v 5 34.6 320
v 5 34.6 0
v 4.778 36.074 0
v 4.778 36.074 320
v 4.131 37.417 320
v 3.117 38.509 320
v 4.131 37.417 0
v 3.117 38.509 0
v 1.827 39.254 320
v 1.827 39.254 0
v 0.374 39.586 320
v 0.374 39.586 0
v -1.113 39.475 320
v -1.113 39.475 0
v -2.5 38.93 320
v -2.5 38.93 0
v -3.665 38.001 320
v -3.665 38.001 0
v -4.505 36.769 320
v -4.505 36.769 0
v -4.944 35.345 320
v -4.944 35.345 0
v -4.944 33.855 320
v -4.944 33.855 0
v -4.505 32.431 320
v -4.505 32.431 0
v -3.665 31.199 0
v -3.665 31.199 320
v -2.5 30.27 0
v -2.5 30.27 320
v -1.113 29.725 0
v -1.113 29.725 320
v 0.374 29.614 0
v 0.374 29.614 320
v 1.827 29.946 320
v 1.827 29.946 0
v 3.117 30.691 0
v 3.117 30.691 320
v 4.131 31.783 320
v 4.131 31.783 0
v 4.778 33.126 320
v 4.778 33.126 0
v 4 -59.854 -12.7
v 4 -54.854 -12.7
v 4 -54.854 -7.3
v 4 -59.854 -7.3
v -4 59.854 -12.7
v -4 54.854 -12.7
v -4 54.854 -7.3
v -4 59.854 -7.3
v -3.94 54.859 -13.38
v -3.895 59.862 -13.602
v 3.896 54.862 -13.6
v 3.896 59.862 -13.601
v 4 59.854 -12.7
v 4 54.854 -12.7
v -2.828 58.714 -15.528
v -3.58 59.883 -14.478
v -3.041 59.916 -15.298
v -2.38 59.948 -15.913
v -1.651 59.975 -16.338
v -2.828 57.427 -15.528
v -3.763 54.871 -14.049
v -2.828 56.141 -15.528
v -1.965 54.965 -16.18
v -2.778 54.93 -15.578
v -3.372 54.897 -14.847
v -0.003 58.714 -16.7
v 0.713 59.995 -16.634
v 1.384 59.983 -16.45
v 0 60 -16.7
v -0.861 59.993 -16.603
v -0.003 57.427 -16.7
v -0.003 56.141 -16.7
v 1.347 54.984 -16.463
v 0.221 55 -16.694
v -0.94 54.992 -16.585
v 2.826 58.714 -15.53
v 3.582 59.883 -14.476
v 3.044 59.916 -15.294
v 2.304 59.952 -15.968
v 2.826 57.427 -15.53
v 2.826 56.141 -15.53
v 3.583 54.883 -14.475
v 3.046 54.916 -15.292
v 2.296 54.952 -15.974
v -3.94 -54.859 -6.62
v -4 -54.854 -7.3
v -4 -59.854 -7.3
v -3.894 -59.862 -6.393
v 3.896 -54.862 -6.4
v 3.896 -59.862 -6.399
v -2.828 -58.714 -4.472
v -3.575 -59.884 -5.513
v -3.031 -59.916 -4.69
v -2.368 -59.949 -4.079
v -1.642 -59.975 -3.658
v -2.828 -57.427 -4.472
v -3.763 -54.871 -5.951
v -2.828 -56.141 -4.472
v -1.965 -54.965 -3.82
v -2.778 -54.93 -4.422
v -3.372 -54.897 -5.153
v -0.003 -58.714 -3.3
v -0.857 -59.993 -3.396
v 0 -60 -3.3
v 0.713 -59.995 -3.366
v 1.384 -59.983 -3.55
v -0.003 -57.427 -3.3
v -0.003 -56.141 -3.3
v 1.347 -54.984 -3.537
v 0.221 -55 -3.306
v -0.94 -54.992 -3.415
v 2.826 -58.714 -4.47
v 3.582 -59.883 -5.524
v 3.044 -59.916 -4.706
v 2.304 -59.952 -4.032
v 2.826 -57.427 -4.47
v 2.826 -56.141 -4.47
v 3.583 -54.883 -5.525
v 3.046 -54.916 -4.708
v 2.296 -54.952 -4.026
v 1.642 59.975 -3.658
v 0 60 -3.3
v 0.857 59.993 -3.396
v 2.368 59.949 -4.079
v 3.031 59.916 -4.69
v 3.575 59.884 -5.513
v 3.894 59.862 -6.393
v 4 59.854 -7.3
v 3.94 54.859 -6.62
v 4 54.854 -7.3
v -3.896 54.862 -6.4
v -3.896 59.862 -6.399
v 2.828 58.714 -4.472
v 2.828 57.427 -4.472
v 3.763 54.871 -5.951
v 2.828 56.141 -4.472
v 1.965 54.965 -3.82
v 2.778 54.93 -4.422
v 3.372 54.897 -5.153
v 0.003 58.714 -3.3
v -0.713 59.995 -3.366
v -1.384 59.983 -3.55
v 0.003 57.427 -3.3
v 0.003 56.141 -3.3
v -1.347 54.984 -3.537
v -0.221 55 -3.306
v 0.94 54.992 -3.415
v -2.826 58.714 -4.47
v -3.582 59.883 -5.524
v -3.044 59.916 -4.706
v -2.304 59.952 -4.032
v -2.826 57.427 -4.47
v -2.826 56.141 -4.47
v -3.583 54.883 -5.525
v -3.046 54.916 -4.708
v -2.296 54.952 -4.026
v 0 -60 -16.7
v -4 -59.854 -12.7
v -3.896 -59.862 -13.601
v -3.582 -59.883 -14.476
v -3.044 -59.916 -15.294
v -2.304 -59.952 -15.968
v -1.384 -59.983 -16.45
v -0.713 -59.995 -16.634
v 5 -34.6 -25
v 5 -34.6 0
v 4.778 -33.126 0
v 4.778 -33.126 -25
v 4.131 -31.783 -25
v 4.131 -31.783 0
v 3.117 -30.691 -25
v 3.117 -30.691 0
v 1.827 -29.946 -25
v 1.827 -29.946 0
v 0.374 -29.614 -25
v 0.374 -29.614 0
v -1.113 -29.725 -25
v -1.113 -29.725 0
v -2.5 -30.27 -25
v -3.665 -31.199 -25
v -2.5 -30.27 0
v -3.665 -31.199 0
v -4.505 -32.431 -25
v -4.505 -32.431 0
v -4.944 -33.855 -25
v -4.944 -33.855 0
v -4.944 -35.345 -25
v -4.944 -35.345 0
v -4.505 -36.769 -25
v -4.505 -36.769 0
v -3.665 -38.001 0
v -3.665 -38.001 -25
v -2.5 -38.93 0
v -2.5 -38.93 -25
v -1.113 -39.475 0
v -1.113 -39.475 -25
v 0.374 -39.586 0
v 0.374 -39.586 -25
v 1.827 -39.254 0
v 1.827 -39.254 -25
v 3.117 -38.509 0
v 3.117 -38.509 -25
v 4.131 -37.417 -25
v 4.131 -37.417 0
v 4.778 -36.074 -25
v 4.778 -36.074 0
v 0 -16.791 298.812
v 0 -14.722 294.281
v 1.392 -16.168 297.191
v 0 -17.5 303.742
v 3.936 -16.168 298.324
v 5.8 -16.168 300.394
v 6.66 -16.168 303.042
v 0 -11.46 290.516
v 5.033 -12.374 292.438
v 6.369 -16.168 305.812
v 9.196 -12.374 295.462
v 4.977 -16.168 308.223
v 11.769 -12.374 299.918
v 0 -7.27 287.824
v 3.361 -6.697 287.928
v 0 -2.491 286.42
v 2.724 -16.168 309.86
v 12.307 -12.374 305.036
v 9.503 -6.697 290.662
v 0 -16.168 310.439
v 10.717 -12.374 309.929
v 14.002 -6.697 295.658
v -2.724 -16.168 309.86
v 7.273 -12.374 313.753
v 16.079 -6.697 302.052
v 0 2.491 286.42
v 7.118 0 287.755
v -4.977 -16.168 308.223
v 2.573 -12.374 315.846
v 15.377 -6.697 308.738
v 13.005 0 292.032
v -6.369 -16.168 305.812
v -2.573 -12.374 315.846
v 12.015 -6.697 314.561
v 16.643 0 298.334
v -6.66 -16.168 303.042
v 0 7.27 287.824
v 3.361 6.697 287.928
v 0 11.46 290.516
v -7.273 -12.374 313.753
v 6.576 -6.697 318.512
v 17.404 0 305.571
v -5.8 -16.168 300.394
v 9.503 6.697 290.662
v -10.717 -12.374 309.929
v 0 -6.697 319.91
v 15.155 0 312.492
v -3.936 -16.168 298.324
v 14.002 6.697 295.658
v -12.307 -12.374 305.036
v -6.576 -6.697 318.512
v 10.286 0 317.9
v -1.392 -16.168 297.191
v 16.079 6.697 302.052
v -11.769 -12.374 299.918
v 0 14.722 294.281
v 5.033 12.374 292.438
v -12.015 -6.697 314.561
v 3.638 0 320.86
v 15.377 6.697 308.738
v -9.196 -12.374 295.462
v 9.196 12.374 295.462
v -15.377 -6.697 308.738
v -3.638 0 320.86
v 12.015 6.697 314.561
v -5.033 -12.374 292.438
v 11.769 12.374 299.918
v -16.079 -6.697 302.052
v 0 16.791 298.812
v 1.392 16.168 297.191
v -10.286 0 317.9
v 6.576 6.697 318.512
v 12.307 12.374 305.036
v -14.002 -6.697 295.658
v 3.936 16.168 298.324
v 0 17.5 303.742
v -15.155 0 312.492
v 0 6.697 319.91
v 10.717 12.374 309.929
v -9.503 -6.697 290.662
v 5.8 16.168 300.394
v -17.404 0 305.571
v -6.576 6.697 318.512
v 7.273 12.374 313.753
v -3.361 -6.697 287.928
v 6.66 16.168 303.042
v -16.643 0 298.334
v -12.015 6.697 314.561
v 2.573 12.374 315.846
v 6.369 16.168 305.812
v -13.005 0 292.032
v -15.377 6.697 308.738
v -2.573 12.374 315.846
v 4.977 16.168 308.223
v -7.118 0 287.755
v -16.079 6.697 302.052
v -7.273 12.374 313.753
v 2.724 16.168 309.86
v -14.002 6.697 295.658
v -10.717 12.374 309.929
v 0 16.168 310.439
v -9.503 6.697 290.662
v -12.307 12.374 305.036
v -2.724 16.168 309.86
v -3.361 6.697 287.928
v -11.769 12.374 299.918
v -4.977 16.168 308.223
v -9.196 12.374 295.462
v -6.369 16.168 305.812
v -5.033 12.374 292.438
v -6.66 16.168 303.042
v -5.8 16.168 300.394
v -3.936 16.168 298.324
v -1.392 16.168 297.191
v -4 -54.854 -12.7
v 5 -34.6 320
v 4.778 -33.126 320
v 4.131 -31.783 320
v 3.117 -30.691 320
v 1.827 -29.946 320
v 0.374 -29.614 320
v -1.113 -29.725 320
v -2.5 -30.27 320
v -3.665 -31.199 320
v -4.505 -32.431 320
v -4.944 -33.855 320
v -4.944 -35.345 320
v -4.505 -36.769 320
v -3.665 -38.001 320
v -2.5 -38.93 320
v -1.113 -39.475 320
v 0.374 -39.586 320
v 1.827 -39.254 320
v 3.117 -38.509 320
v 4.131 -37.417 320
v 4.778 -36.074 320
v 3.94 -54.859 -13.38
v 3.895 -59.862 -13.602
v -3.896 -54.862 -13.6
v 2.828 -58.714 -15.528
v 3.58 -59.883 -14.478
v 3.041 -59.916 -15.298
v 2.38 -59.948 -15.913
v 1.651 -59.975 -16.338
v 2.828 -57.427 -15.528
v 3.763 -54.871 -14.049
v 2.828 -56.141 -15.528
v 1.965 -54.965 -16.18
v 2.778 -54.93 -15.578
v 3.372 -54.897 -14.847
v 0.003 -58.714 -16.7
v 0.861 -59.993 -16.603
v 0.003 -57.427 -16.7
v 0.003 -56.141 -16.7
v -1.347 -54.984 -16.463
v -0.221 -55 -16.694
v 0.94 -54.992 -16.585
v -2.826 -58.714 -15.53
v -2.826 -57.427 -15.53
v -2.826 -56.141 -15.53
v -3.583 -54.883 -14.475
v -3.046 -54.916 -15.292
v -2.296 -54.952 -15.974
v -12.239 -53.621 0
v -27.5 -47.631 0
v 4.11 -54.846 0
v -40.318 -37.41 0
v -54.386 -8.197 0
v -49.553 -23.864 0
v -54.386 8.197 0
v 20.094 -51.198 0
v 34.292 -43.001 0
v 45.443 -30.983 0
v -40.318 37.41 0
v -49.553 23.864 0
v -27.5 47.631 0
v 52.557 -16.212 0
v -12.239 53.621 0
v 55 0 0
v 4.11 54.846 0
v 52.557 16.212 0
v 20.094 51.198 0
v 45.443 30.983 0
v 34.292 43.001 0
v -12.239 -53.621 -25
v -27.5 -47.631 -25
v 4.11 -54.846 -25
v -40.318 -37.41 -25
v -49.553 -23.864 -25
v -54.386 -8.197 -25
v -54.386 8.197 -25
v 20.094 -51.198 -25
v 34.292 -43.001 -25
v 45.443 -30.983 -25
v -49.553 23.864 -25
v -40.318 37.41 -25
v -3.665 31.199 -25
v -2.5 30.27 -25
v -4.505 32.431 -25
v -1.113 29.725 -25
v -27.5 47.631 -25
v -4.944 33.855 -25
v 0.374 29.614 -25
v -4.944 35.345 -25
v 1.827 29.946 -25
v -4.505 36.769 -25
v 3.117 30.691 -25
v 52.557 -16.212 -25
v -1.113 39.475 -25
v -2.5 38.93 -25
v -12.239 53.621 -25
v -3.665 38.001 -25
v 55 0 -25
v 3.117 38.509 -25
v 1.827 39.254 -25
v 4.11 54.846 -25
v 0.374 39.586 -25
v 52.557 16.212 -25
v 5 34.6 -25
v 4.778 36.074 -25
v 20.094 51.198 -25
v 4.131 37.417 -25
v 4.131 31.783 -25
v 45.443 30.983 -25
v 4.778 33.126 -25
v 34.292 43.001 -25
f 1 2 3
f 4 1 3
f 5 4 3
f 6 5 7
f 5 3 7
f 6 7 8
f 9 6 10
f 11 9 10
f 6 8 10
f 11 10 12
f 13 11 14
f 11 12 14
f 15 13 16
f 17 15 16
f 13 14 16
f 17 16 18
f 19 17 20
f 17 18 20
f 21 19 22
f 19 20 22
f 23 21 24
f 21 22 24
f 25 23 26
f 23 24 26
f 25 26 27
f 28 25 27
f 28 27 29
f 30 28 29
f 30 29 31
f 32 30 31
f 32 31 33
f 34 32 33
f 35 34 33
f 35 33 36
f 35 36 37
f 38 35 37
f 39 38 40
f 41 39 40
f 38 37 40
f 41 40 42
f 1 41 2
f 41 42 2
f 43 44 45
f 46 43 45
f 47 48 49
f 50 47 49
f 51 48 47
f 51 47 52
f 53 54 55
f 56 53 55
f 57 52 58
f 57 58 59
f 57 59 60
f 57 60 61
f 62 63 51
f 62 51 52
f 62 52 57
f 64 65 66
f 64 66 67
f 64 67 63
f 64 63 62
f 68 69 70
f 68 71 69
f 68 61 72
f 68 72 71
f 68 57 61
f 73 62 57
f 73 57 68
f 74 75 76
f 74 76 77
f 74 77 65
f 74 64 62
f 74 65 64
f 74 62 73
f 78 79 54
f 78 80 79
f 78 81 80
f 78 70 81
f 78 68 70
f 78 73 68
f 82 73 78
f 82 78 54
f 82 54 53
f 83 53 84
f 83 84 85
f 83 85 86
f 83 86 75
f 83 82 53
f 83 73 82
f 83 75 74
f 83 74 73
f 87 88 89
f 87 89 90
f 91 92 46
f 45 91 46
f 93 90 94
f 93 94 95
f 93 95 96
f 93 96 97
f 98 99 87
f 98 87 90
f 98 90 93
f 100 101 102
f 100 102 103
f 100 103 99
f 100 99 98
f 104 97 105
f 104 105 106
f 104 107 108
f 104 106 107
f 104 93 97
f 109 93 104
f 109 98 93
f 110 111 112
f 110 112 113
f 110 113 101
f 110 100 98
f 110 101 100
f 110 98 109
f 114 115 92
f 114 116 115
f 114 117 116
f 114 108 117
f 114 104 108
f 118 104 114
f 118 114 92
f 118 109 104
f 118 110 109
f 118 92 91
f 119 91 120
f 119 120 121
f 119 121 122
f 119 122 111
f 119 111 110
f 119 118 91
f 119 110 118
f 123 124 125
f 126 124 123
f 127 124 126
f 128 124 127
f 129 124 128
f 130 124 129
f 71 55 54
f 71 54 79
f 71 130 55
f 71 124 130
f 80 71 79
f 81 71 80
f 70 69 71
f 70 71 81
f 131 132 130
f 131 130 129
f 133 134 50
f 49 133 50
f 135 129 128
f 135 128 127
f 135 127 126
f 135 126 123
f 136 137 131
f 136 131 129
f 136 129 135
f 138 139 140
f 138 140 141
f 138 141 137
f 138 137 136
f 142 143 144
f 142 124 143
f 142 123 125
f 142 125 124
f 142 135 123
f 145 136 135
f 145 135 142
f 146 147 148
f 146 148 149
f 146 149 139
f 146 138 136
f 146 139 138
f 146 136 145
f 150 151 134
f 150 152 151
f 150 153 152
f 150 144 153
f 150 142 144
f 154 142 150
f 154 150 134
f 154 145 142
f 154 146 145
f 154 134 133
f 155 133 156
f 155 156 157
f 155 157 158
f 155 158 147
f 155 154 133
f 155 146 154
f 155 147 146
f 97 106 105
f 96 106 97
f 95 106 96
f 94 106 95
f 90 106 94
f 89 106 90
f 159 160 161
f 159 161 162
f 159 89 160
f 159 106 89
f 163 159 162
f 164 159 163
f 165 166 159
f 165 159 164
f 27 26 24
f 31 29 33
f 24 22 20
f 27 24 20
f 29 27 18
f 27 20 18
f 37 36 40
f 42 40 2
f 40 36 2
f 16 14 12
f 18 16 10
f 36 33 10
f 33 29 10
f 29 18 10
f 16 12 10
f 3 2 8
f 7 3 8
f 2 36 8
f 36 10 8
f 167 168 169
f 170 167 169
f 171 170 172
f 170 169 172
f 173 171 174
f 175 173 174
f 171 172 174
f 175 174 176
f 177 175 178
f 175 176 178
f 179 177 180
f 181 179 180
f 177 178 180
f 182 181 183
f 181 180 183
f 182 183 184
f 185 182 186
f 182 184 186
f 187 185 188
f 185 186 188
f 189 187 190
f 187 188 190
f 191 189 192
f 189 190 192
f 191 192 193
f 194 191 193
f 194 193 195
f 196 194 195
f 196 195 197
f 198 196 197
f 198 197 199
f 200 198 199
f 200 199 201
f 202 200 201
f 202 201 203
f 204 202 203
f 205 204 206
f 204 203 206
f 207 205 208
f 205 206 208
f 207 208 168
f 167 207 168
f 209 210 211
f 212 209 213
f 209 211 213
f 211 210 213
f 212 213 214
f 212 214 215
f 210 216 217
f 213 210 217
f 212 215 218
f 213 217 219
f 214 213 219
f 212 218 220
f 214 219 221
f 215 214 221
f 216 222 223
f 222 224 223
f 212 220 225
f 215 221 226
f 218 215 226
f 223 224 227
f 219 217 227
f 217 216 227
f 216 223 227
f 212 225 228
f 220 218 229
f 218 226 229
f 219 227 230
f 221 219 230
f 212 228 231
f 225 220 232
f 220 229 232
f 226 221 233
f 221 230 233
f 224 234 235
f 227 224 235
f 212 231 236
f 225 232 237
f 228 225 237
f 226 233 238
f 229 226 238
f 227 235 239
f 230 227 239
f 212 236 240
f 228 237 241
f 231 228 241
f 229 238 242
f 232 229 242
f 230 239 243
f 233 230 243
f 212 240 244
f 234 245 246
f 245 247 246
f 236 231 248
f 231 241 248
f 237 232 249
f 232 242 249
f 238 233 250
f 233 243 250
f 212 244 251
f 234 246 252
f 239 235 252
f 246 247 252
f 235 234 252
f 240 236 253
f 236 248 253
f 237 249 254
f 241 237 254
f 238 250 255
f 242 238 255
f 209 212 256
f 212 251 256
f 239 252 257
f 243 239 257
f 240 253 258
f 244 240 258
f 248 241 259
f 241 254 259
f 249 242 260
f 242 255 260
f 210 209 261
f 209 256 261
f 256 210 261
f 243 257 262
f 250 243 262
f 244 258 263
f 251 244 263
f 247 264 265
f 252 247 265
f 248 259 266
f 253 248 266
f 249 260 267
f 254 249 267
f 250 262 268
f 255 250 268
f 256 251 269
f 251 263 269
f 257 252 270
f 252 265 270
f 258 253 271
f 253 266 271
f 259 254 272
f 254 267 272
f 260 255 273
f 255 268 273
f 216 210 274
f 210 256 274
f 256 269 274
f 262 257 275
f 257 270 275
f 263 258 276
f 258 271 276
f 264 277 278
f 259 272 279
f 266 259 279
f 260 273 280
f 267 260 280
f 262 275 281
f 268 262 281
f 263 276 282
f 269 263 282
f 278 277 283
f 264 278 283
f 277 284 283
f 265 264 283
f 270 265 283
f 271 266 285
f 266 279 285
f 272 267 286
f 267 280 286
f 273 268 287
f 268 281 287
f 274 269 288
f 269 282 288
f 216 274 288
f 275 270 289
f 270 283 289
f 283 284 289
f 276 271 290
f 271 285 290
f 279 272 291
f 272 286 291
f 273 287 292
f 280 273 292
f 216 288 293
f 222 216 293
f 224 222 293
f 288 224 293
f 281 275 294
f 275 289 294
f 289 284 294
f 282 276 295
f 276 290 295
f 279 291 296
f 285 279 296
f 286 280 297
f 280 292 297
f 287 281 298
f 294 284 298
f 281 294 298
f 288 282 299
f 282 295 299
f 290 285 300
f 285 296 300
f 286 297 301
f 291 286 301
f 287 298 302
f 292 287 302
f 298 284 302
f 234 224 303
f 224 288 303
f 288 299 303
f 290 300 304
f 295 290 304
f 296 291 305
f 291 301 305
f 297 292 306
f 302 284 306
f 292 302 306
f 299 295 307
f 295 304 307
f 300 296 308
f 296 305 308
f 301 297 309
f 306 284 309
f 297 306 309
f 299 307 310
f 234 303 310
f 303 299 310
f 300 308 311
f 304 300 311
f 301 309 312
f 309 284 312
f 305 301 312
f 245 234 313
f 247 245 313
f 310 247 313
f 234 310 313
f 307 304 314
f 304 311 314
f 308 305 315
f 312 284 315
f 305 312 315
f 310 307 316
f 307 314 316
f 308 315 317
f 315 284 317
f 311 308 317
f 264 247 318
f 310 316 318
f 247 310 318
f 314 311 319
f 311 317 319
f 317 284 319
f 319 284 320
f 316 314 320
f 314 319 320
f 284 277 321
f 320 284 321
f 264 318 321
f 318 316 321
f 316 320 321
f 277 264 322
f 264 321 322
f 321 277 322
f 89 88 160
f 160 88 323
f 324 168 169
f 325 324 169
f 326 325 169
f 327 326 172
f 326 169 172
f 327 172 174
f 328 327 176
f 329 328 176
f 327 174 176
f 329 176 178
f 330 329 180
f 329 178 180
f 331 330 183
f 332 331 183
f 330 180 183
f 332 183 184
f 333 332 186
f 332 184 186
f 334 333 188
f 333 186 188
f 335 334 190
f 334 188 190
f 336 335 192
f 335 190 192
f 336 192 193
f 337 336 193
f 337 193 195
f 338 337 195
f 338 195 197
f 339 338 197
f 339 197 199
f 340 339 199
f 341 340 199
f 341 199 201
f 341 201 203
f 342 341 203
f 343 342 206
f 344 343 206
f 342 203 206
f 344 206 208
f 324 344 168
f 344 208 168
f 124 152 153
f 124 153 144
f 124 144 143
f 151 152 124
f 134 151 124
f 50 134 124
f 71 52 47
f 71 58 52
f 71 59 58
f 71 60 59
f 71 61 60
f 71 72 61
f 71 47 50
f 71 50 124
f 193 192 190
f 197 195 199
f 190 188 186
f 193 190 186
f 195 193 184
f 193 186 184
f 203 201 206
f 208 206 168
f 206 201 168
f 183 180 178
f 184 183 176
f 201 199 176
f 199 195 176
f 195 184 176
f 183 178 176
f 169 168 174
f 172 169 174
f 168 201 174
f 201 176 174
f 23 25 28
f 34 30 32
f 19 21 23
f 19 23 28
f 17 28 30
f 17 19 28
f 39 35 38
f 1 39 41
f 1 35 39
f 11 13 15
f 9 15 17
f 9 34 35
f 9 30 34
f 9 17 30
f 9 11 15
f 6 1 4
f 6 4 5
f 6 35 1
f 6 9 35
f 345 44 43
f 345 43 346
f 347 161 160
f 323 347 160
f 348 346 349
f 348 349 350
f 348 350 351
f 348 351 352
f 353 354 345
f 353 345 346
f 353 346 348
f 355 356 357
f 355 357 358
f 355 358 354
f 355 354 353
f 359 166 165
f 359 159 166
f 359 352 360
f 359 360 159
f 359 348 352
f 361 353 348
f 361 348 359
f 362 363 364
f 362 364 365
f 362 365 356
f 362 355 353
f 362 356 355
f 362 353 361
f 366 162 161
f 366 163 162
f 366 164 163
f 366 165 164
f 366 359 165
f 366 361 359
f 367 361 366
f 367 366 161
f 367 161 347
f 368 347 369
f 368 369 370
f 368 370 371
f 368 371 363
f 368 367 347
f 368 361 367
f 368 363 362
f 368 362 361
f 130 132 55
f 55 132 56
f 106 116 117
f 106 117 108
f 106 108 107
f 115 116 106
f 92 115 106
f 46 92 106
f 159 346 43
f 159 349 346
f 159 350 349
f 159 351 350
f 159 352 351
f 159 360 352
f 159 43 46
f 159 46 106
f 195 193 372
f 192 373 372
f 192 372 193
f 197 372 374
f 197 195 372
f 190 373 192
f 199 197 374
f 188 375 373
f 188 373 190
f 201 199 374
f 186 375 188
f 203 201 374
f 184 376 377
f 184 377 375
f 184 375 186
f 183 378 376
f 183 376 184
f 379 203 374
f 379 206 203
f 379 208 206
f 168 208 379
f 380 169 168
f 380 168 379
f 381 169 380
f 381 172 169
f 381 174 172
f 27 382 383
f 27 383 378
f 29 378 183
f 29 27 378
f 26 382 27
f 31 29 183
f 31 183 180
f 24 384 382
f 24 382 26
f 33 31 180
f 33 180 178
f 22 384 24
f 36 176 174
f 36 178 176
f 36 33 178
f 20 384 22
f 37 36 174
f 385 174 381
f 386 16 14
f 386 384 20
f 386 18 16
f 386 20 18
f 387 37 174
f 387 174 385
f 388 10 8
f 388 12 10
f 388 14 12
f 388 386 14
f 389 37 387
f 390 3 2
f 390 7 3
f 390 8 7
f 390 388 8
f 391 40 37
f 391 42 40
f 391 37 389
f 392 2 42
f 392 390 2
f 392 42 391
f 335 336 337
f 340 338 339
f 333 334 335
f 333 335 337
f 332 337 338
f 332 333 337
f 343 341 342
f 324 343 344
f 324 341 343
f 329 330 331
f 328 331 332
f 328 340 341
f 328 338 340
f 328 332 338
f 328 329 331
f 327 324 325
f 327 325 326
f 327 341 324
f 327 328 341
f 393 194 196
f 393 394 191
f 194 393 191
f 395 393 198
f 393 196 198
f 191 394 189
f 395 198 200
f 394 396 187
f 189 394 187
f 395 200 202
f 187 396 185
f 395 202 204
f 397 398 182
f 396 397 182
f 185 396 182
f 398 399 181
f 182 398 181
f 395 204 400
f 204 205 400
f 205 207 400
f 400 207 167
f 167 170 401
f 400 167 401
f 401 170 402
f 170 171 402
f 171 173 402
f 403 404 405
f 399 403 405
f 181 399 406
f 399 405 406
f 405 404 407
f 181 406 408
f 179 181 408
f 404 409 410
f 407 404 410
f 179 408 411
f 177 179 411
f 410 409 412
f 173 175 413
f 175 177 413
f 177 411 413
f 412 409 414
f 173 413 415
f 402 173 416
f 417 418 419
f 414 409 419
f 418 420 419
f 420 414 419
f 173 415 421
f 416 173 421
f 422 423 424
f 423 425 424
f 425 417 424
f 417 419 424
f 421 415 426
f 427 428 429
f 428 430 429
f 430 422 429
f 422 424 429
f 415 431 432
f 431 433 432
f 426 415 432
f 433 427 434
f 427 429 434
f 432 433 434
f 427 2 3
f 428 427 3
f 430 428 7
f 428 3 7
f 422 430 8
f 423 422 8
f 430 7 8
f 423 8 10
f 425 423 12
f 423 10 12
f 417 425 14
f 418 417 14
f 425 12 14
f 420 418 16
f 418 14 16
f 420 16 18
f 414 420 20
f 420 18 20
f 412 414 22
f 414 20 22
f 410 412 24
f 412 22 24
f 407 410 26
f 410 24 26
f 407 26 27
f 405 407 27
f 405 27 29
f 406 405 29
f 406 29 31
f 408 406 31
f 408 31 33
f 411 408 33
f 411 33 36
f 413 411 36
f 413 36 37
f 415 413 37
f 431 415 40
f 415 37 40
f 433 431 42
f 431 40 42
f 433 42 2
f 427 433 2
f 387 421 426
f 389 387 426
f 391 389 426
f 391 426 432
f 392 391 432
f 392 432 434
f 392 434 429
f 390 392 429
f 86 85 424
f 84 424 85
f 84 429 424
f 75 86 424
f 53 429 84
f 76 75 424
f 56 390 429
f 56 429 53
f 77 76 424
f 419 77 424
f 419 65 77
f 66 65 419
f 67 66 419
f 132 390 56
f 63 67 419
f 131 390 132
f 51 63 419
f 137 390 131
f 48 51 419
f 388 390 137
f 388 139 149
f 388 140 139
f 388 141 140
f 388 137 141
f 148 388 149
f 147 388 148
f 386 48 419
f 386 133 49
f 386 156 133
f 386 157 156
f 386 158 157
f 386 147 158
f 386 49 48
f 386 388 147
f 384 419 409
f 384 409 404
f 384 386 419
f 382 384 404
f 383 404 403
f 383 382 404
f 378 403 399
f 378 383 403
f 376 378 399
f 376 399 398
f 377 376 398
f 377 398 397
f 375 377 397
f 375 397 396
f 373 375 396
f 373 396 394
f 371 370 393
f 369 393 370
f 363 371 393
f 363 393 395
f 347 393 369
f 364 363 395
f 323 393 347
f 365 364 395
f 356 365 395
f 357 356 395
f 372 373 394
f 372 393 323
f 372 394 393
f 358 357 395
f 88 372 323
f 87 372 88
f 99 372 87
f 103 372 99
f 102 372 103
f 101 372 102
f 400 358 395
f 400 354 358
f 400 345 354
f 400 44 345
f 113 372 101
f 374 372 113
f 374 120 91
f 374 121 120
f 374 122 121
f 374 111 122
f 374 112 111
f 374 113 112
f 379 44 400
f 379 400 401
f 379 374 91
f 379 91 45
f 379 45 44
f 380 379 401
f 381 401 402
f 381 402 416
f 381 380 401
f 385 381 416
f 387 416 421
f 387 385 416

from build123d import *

# Parameters (mm, degrees)
SKETCH2_R             = 55
SKETCH2_R_2           = 5
BOSS_EXTRUDE1_DEPTH   = 25
SKETCH3_R             = 5
BOSS_EXTRUDE2_DEPTH   = 320
BOSS_EXTRUDE2_2_DEPTH = 320
BOSS_EXTRUDE3_START   = 54
BOSS_EXTRUDE3_DEPTH   = 6.000000091
BOSS_EXTRUDE3_START_2 = -18
BOSS_EXTRUDE3_2_DEPTH = 16
CIRPATTERN1_COUNT     = 2


with BuildPart() as part:
    # Sketch2 → Boss-Extrude1 (new body)
    with BuildSketch(Plane.XY):
        Circle(SKETCH2_R)
        with Locations((0, 34.6)):
            Circle(SKETCH2_R_2, mode=Mode.SUBTRACT)
        with Locations((0, -34.6)):
            Circle(SKETCH2_R_2, mode=Mode.SUBTRACT)
    extrude(amount=-BOSS_EXTRUDE1_DEPTH)

    # Boss-Extrude3: read off the stored shape, not the designer's step
    # Boss-Extrude3 outline → Boss-Extrude3 (add)
    with BuildSketch(Plane(origin=(0, 0, 0), x_dir=(1, 0, 0), z_dir=(0, 1, 0)).offset(BOSS_EXTRUDE3_START)):
        with BuildLine():
            add(Edge.make_bspline(
                [(-4, 12.7), (-4, 13.757306955), (-3.566098709, 14.790783091), (-2.090649903, 16.266176794), (-1.046492028, 16.699275324), (1.040944828, 16.700722753), (2.079203486, 16.276596211), (3.573660151, 14.784245838), (4, 13.757305644), (4, 12.7)],
                knots=[0, 0, 0, 0, 0.25, 0.25, 0.5, 0.5, 0.75, 0.75, 1, 1, 1, 1], degree=3))
            Line((-4, 12.7), (-4, 7.3))
            add(Edge.make_bspline(
                [(4, 7.3), (4, 6.242693045), (3.566098709, 5.209216909), (2.090649903, 3.733823206), (1.046492028, 3.300724676), (-1.040944828, 3.299277247), (-2.079203486, 3.723403789), (-3.573660151, 5.215754162), (-4, 6.242694356), (-4, 7.3)],
                knots=[0, 0, 0, 0, 0.25, 0.25, 0.5, 0.5, 0.75, 0.75, 1, 1, 1, 1], degree=3))
            Line((4, 7.3), (4, 12.7))
        make_face()
    boss_extrude3 = extrude(amount=BOSS_EXTRUDE3_DEPTH)

    # Boss-Extrude3 2 outline → Boss-Extrude3 2 (cut)
    with BuildSketch(Plane.XY.offset(BOSS_EXTRUDE3_START_2)):
        with BuildLine():
            ThreePointArc((-4, 59.854352608), (-2.001325119, 59.963576101), (5.3e-07, 60))
            Line((5.3e-07, 60), (-4, 60.000000091))
            Line((-4, 60.000000091), (-4, 59.854352608))
        make_face()
        with BuildLine():
            ThreePointArc((5.3e-07, 60), (2.001325648, 59.963576081), (4, 59.854352608))
            Line((4, 59.854352608), (4, 60.000000091))
            Line((4, 60.000000091), (5.3e-07, 60))
        make_face()
    boss_extrude3_2 = extrude(amount=BOSS_EXTRUDE3_2_DEPTH, mode=Mode.SUBTRACT)

    # CirPattern1: Boss-Extrude3, Boss-Extrude3 2 ×2 about axis
    cirpattern1_axis = Axis((0, 0, 0), (0, 0, 1))
    add([boss_extrude3.rotate(cirpattern1_axis, i * 360 / CIRPATTERN1_COUNT) for i in range(1, CIRPATTERN1_COUNT)])
    add([boss_extrude3_2.rotate(cirpattern1_axis, i * 360 / CIRPATTERN1_COUNT) for i in range(1, CIRPATTERN1_COUNT)], mode=Mode.SUBTRACT)


with BuildPart() as body_2:
    # Sketch3 → Boss-Extrude2 (new body)
    with BuildSketch(Plane.XY):
        with Locations((0, -34.6)):
            Circle(SKETCH3_R)
    extrude(amount=BOSS_EXTRUDE2_DEPTH)


with BuildPart() as body_3:
    # Sketch3 → Boss-Extrude2 2 (new body)
    with BuildSketch(Plane.XY):
        with Locations((0, 34.6)):
            Circle(SKETCH3_R)
    extrude(amount=BOSS_EXTRUDE2_2_DEPTH)


with BuildPart() as body_4:
    # Sketch5 → Revolve1 (revolve)
    with BuildSketch(Plane(origin=(0, 0, 0), x_dir=(0, 0, -1), z_dir=(1, 0, 0))):
        with BuildLine():
            Line((-303.742089953, 17.5), (-303.742089953, -17.5))
            ThreePointArc((-303.742089953, -17.5), (-286.242089953, 0), (-303.742089953, 17.5))
        make_face()
    revolve(axis=Axis((0, 17.5, 303.742089953), (0, -1, 0)))


solid = Compound([part.part, body_2.part, body_3.part, body_4.part])
